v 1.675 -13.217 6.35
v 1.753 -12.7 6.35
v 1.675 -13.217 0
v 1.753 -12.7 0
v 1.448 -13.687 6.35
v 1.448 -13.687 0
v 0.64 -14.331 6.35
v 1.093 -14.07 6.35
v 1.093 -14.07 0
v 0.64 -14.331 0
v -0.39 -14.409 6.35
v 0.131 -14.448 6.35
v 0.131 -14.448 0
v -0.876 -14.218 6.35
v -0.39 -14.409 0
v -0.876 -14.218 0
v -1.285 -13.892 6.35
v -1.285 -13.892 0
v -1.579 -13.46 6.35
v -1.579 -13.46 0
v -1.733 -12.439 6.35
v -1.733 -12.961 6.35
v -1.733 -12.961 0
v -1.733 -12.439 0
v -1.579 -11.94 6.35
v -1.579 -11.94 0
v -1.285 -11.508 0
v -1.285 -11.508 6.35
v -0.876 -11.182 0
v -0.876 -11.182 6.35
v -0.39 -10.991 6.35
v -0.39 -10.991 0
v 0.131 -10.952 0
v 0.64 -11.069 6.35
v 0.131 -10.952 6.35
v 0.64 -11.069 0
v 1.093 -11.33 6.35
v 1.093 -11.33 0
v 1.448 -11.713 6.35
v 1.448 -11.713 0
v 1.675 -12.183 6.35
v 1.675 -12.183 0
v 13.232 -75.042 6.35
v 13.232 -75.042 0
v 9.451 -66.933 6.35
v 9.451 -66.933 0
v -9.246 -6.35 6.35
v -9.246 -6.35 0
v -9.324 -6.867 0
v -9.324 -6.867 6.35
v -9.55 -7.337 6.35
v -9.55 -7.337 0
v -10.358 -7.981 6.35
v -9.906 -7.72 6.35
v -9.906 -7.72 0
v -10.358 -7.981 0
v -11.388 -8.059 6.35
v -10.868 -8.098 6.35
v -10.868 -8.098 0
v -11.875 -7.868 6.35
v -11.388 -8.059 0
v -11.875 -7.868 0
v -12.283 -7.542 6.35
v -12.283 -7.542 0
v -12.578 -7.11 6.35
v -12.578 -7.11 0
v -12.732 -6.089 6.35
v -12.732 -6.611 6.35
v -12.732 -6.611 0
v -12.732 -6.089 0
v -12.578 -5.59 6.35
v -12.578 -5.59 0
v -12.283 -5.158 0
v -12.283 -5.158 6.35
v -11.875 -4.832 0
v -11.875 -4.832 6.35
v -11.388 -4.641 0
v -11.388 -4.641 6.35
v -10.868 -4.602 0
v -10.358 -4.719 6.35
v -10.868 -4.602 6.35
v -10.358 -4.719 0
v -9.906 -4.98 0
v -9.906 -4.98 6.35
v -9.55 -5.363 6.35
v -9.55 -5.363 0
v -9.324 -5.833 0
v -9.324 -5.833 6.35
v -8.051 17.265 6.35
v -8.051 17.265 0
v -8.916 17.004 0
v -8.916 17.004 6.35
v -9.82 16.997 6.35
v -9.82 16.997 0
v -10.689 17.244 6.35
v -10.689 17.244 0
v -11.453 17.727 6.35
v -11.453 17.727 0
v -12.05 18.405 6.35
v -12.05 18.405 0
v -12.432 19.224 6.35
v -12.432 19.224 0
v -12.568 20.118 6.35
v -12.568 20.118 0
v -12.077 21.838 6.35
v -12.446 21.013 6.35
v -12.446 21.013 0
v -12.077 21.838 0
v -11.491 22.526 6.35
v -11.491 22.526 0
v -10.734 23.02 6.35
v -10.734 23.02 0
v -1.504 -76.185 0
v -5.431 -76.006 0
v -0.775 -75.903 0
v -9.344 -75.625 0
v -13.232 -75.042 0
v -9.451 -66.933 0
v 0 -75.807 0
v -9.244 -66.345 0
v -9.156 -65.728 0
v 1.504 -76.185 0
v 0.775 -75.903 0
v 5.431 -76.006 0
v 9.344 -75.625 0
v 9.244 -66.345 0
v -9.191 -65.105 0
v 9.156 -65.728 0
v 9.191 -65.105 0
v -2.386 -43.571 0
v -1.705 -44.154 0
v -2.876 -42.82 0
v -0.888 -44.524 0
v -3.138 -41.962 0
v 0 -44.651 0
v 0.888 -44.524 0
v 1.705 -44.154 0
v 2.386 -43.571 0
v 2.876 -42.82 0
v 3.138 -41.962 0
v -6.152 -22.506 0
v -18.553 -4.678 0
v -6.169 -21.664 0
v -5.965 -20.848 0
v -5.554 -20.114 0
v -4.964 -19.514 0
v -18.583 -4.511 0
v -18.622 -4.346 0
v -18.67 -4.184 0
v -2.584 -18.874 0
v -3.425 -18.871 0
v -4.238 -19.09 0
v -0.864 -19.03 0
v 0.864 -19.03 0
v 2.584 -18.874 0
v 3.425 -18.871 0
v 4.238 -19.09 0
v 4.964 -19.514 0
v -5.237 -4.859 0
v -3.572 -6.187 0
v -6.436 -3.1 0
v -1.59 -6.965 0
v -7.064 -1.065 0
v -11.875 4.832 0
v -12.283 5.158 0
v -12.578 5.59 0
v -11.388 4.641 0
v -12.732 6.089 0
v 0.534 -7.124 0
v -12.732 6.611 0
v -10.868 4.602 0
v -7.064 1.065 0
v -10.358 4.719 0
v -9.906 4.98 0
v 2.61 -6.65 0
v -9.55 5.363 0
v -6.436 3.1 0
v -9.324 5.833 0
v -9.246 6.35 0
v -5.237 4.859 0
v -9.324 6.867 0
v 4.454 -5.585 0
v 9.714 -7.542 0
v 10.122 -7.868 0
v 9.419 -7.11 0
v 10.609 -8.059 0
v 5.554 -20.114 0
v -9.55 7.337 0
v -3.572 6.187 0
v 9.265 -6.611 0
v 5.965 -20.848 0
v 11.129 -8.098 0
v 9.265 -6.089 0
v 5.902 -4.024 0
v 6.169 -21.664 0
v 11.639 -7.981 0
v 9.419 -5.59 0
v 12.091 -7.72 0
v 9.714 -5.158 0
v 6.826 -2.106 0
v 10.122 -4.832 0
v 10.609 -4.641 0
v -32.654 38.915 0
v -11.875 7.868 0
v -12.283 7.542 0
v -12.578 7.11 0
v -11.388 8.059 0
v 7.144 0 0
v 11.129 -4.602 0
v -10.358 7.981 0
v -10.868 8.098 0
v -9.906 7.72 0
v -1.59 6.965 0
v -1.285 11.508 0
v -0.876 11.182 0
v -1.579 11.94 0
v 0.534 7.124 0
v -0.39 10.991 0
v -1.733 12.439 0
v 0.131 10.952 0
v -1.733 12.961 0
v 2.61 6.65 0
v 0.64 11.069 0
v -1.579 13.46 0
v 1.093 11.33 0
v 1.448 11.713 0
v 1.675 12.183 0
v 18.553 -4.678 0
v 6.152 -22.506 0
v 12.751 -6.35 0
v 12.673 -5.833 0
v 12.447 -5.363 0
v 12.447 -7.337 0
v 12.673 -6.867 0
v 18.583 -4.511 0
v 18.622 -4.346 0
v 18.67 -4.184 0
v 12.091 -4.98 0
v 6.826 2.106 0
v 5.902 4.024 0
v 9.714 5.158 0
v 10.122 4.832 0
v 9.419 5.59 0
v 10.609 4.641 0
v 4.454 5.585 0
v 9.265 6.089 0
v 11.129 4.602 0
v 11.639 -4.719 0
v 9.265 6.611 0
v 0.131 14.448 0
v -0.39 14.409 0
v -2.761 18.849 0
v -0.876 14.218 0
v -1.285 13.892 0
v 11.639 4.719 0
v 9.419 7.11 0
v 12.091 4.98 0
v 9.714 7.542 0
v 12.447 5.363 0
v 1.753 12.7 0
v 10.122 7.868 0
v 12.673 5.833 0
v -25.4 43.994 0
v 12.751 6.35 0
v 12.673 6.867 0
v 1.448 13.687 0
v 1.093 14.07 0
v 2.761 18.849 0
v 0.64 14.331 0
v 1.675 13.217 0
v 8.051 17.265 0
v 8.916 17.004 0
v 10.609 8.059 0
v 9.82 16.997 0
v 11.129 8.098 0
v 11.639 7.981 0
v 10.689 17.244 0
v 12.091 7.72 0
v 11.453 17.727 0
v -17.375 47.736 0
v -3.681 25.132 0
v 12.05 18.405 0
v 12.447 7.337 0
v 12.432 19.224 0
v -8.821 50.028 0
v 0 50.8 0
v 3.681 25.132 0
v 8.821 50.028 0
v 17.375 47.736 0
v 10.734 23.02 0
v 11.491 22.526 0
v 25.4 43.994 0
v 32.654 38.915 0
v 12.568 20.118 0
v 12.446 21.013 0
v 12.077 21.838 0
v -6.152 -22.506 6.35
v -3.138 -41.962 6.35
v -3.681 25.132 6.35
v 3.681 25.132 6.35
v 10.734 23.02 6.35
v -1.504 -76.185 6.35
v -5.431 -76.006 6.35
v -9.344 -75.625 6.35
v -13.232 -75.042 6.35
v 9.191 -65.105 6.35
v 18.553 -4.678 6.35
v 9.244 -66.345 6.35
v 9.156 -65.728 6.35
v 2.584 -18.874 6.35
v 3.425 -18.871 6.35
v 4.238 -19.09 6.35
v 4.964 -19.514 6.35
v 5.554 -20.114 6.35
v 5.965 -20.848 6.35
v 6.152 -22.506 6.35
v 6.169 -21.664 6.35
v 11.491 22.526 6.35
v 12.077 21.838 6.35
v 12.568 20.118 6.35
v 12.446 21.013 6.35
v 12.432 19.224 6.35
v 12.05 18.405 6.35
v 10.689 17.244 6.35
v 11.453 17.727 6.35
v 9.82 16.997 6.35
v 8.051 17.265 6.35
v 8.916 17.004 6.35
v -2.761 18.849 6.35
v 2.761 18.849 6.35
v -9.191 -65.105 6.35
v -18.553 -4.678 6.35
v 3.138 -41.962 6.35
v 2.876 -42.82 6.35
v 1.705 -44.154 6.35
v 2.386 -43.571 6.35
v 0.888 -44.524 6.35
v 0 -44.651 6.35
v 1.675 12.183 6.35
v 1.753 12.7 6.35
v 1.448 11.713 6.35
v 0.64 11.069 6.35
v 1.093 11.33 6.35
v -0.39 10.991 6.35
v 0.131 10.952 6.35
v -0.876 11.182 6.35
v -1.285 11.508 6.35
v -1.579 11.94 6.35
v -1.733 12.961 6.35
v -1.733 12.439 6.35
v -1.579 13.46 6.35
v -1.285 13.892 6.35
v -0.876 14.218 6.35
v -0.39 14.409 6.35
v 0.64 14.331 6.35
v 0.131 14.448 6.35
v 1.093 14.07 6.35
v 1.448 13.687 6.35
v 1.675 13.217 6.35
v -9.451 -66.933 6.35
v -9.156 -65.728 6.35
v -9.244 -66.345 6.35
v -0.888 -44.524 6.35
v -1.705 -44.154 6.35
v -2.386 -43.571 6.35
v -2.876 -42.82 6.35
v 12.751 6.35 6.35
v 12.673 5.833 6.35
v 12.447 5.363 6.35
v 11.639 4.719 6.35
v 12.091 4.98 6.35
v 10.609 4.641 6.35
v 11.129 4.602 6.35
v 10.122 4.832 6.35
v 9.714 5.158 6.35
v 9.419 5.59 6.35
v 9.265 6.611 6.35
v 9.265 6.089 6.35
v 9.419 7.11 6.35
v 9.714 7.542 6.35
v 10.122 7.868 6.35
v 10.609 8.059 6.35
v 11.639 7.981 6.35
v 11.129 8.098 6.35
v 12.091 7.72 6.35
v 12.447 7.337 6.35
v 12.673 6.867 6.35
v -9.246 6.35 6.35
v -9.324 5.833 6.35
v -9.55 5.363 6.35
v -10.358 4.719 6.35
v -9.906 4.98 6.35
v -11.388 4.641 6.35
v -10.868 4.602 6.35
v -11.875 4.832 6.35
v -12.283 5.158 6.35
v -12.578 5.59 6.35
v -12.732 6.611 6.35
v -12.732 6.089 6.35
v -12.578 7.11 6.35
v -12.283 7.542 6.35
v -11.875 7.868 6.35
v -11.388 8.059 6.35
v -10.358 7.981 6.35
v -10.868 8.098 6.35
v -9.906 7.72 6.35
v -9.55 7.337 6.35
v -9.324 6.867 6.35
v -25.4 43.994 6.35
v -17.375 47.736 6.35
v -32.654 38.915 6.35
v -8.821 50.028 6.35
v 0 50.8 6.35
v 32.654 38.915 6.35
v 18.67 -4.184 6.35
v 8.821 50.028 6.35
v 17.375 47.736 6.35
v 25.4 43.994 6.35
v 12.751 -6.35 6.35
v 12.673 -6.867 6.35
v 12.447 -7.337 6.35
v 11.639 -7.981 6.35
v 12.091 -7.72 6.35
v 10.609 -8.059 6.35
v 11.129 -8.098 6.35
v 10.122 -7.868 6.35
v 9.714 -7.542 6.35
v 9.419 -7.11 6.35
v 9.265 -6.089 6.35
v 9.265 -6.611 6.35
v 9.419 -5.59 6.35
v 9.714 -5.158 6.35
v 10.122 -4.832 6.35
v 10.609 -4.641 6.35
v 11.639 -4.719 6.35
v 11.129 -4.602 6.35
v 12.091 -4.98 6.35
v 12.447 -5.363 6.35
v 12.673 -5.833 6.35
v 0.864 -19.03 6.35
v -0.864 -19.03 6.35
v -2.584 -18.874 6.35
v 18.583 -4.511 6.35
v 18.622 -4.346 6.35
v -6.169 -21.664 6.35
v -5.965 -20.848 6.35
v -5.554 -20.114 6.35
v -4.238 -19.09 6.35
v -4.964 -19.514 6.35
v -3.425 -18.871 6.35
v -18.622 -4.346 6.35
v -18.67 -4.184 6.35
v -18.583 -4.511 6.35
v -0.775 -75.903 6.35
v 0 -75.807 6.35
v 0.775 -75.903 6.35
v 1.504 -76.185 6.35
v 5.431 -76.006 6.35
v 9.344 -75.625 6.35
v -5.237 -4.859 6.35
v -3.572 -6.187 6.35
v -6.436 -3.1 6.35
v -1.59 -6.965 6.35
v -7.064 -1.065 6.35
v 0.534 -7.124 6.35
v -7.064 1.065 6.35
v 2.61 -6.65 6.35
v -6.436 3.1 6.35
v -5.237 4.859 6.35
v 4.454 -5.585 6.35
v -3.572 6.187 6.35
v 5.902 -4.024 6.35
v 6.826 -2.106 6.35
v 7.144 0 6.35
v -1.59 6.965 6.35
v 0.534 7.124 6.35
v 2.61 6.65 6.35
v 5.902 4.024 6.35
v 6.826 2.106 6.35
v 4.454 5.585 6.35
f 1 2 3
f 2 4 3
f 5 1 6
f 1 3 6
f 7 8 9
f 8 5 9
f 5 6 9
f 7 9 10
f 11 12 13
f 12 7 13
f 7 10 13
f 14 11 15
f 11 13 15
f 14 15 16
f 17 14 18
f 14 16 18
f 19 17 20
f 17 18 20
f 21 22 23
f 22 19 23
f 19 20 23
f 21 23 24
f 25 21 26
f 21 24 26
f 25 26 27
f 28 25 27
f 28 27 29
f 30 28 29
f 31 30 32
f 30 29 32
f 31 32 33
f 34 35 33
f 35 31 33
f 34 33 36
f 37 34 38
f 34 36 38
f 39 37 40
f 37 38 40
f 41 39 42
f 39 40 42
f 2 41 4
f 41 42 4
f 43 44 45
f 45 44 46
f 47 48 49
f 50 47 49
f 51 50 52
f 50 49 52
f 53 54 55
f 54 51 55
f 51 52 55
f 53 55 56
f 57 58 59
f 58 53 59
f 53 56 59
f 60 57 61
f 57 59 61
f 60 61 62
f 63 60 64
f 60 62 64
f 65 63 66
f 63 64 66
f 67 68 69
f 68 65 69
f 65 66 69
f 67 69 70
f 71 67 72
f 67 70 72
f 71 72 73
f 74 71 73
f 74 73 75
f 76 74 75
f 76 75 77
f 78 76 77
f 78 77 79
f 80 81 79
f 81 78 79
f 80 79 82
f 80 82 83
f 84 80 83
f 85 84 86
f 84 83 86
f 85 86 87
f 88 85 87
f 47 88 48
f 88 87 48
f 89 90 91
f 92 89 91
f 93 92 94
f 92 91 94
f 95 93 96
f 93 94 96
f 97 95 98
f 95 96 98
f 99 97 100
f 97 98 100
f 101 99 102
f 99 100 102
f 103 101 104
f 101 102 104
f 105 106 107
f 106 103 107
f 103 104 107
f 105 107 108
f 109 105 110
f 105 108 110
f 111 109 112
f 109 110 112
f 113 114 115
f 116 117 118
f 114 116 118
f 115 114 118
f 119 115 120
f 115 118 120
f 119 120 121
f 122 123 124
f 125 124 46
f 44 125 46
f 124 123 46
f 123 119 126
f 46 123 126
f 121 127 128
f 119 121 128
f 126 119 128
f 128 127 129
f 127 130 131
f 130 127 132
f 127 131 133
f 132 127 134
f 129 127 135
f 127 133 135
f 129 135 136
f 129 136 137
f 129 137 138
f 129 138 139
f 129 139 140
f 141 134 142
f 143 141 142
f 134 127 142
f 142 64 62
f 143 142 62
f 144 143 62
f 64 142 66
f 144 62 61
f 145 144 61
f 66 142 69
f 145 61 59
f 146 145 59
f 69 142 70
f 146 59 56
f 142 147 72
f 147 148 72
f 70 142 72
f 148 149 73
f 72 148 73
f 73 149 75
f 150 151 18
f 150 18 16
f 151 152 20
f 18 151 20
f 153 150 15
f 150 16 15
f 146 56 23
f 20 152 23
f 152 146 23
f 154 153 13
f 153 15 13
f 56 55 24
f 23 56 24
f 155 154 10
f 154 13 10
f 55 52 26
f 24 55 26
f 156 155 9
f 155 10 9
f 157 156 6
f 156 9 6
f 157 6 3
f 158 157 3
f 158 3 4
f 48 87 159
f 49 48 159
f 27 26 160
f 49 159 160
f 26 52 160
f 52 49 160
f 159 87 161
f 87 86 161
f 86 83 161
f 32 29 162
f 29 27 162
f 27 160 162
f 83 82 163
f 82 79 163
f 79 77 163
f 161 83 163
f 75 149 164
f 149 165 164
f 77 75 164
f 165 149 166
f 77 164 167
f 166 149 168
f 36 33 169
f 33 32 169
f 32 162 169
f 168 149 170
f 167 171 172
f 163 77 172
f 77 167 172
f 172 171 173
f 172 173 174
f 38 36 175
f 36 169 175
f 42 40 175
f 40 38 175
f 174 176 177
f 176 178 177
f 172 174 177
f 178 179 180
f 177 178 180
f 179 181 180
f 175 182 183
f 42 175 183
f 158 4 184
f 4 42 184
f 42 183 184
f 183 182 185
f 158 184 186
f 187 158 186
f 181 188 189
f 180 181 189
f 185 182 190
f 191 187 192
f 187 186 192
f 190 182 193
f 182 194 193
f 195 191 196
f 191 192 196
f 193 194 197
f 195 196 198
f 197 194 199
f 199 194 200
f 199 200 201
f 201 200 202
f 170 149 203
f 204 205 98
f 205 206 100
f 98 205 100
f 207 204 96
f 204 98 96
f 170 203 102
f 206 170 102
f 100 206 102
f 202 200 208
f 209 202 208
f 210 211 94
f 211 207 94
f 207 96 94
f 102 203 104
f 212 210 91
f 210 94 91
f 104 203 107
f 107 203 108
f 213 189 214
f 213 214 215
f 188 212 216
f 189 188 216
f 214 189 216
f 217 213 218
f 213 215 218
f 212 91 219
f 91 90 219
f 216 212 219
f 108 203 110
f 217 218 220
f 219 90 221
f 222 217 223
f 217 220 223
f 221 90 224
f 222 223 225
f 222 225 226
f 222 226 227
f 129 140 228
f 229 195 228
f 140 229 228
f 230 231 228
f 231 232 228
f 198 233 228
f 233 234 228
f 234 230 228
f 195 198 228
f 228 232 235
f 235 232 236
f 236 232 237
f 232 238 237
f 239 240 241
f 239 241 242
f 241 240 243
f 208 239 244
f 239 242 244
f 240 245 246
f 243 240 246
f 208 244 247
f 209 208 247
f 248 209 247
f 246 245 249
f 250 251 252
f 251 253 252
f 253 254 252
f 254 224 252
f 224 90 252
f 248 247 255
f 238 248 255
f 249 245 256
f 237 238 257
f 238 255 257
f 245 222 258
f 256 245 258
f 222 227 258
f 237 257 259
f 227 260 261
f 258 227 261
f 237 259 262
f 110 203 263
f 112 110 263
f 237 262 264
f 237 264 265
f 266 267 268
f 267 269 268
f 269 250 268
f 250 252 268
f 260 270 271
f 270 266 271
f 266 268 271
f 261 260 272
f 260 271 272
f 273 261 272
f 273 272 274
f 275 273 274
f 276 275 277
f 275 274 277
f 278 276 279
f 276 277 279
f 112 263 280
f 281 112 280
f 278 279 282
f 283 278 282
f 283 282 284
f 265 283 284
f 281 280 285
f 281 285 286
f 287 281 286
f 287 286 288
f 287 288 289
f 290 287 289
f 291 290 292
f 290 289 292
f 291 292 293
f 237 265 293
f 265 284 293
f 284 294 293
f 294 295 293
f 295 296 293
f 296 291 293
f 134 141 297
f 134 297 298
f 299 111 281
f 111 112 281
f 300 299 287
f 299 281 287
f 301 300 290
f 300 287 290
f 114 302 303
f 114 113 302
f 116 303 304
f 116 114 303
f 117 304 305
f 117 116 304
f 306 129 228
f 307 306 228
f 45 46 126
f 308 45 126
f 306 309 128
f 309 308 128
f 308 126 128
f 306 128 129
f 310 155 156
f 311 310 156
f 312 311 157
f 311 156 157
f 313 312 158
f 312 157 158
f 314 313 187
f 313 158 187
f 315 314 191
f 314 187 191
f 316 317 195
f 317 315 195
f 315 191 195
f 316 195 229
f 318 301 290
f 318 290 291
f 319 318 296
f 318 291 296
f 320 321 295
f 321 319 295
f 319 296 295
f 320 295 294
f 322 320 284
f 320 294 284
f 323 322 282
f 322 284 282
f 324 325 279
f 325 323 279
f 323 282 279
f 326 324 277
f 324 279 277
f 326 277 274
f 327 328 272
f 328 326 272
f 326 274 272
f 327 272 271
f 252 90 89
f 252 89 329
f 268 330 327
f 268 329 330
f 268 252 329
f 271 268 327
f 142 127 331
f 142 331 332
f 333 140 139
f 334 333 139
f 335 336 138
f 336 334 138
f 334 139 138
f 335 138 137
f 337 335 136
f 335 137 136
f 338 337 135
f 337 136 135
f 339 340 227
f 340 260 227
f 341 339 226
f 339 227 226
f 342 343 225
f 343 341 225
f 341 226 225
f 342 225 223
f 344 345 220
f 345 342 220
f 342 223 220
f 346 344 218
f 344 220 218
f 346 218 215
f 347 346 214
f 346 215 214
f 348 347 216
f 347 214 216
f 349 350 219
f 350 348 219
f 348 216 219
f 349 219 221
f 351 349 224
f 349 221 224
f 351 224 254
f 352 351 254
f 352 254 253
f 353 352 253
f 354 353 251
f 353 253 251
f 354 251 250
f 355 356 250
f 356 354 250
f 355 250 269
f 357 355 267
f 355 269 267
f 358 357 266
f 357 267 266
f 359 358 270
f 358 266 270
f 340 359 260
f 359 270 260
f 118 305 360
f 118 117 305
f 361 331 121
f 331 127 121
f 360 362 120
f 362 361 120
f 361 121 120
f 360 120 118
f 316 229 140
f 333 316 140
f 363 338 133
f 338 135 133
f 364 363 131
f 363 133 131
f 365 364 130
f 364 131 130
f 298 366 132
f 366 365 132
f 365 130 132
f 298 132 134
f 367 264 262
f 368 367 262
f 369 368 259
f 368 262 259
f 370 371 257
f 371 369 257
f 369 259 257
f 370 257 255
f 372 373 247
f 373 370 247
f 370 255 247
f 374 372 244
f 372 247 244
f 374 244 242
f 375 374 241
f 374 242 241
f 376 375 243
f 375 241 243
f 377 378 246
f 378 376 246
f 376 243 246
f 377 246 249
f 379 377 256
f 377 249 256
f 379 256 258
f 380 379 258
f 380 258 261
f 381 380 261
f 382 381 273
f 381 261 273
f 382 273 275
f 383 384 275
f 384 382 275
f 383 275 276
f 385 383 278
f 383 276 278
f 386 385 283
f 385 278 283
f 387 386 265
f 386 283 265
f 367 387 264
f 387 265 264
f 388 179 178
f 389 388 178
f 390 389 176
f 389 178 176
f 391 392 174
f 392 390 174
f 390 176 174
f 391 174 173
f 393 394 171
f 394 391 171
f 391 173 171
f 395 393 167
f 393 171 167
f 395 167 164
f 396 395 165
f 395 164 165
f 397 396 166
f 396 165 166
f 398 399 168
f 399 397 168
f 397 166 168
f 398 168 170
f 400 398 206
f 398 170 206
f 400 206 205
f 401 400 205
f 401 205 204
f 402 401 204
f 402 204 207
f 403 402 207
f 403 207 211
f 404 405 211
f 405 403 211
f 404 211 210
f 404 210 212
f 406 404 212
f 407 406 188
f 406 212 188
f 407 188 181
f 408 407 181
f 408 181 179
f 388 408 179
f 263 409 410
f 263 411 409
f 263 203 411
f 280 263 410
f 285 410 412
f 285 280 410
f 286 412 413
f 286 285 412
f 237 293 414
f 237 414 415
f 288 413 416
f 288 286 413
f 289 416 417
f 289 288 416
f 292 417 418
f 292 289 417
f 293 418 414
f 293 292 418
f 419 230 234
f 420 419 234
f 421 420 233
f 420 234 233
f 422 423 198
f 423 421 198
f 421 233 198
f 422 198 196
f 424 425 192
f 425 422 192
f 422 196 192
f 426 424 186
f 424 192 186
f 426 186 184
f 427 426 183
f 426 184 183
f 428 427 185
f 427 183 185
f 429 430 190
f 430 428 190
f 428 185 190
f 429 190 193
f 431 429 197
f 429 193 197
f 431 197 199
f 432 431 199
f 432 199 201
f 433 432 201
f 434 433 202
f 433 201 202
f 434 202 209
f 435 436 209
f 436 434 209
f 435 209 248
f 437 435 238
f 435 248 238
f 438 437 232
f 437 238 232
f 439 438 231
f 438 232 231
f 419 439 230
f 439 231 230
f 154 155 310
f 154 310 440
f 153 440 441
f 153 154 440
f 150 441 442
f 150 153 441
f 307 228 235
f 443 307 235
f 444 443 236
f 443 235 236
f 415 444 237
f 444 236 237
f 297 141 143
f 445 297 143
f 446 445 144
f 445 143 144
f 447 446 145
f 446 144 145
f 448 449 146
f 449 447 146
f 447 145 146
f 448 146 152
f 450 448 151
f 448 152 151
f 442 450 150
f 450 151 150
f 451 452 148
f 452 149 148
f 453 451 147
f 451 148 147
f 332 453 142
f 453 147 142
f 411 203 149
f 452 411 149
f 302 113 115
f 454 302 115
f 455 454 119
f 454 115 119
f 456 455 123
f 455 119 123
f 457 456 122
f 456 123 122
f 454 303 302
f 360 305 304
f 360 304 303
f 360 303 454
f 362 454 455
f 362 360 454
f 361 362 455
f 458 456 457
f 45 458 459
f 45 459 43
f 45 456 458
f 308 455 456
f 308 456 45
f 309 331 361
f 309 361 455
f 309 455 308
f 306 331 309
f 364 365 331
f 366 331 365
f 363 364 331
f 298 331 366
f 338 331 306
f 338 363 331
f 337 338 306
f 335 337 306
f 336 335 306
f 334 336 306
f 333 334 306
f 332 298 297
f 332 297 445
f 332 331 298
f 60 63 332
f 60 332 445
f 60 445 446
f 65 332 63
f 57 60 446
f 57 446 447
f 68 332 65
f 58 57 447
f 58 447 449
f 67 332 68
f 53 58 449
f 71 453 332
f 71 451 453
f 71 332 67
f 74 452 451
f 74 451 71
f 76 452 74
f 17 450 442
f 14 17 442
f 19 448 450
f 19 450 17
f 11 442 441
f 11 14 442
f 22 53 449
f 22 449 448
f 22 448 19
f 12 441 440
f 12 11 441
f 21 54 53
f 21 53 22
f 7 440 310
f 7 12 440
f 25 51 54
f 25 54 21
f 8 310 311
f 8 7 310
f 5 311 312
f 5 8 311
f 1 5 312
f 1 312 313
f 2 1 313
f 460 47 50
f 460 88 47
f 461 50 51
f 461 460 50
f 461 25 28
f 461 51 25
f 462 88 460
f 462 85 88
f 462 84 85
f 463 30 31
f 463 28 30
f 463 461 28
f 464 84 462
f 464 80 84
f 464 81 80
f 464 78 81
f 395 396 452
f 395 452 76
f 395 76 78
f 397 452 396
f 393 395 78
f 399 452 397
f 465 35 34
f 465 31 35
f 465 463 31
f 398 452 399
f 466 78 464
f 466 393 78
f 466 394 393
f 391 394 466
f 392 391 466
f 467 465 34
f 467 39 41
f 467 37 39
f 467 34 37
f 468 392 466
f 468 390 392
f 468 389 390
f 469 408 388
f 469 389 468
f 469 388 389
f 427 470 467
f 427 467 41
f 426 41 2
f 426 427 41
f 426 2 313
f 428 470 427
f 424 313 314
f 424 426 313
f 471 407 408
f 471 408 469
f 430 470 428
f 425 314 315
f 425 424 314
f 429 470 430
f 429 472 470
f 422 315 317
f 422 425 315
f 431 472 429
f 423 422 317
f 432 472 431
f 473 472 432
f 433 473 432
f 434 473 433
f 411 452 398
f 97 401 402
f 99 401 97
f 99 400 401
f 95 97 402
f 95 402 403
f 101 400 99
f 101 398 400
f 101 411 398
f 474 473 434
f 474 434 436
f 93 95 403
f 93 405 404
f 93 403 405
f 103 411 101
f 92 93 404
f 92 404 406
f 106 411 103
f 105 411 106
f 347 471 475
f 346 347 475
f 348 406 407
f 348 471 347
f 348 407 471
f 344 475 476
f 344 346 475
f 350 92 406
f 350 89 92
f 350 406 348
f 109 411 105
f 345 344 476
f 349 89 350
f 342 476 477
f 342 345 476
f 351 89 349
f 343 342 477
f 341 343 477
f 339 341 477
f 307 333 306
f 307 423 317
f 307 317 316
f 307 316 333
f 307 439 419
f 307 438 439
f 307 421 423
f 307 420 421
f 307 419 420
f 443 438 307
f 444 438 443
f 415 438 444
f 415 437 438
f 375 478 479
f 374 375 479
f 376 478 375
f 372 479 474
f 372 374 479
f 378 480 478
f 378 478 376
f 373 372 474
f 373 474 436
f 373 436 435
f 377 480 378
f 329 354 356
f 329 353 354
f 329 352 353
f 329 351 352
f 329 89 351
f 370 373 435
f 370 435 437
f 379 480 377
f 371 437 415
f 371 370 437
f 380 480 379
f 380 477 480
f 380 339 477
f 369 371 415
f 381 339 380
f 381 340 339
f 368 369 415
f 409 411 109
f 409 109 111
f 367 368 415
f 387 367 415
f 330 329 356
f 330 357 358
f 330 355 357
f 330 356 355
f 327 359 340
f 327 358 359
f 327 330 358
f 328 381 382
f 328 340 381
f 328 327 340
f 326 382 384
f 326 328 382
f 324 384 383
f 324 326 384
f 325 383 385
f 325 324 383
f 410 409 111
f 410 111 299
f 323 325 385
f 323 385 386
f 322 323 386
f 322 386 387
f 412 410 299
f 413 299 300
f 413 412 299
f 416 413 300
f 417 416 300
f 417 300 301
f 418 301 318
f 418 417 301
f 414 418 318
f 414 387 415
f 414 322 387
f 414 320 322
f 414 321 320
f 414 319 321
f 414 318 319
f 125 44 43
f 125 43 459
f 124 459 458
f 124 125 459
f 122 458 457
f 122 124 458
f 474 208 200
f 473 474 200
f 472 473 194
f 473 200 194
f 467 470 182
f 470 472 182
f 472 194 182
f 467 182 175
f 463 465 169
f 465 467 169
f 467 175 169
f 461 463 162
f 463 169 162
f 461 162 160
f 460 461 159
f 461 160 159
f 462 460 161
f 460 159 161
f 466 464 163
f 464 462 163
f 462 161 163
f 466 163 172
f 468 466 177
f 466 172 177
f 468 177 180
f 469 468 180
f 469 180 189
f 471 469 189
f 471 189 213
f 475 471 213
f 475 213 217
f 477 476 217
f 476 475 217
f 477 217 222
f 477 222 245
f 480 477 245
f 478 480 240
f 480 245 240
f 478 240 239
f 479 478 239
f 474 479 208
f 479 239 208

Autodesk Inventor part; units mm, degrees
ref_plane "YZ Plane" through (0, 0, 0) normal (1, 0, 0) x (0, 1, 0)
ref_plane "XZ Plane" through (0, 0, 0) normal (0, 1, 0) x (-1, 0, 0)
ref_plane "XY Plane" through (0, 0, 0) normal (0, 0, 1) x (1, 0, 0)
sketch "Sketch1" plane through (0, 0, 0) normal (0, 0, 1) x (1, 0, 0)
  circle A0 centre (0, 0) radius 7.1437
  line L0 (0, 0) -> (0, 12.7) construction
  circle A1 centre (0, 12.7) radius 1.7526
  circle A2 centre (-10.9985, 6.35) radius 1.7526
  circle A3 centre (-10.9985, -6.35) radius 1.7526
  circle A4 centre (0, -12.7) radius 1.7526
  circle A5 centre (10.9985, -6.35) radius 1.7526
  circle A6 centre (10.9985, 6.35) radius 1.7526
  circle A7 centre (0, 0) radius 19.05
  circle A8 centre (0, 0) radius 76.2 construction
  line L1 (0, 0) -> (-13.232, -75.0424) construction
  line L2 (-13.232, -75.0424) -> (4.8119, -36.3472) construction
  line L3 (-13.232, -75.0424) -> (-9.0429, -66.0589)
  line L4 (-9.0429, -66.0589) -> (-18.8254, -2.9166)
  circle A9 centre (0, 0) radius 66.675 construction
  line L5 (0, 0) -> (0, -76.2) construction
  arc A10 (-13.232, -75.0424) -> (0, -76.2) centre (0, 0) ccw
  line L6 (13.232, -75.0424) -> (9.0429, -66.0589)
  line L7 (9.0429, -66.0589) -> (18.8254, -2.9166)
  arc A11 (0, -76.2) -> (13.232, -75.0424) centre (0, 0) ccw
  arc A12 (-2.5837, -18.874) -> (-6.1519, -22.5057) centre (-3.0143, -22.0196) ccw
  line L8 (-6.1519, -22.5057) -> (-3.1376, -41.9621)
  arc A13 (-3.1376, -41.9621) -> (0, -44.651) centre (0, -41.476) ccw
  arc A14 (6.1519, -22.5057) -> (2.5837, -18.874) centre (3.0143, -22.0196) ccw
  line L9 (6.1519, -22.5057) -> (3.1376, -41.9621)
  arc A15 (0, -44.651) -> (3.1376, -41.9621) centre (0, -41.476) ccw
  circle A16 centre (0, 0) radius 50.8 construction
  line L10 (-32.6536, 38.9151) -> (-18.1201, -5.8791)
  line L11 (-32.6536, 38.9151) -> (0, 0) construction
  arc A17 (0, 50.8) -> (-32.6536, 38.9151) centre (0, 0) ccw
  line L12 (32.6536, 38.9151) -> (18.1201, -5.8791)
  line L13 (32.6536, 38.9151) -> (0, 0) construction
  arc A18 (32.6536, 38.9151) -> (0, 50.8) centre (0, 0) ccw
  arc A19 (9.3927, 20.1427) -> (-9.3927, 20.1427) centre (0, 0) ccw construction
  arc A20 (10.7345, 23.0202) -> (-10.7345, 23.0202) centre (0, 0) ccw
  arc A21 (8.0509, 17.2652) -> (-8.0509, 17.2652) centre (0, 0) ccw
  arc A22 (8.0509, 17.2652) -> (10.7345, 23.0202) centre (9.3927, 20.1427) ccw
  arc A23 (-10.7345, 23.0202) -> (-8.0509, 17.2652) centre (-9.3927, 20.1427) ccw
  line L14 (-9.3927, 20.1427) -> (0, 0) construction
  line L15 (0, 0) -> (9.3927, 20.1427) construction
  line L16 (0, -72.9607) -> (-1.5036, -76.1852)
  line L17 (-1.5036, -76.1852) -> (0, -72.9607)
  line L18 (1.5036, -76.1852) -> (0, -72.9607)
  point P0 (-18.5915, -4.4261)
  point P1 (18.5915, -4.4261)
  point P2 (2.5837, -18.874)
  point P3 (-11.1375, -70.5506)
  point P4 (8.0509, 17.2652)
  point P5 (-8.0509, 17.2652)
  dimension "d10" = 133.35
  dimension "d0" = 14.2875
  dimension "d1" = 12.7
  dimension "d2" = 3.5052
  dimension "d5" = 360
  dimension "d7" = 38.1
  dimension "d8" = 152.4
  dimension "d9" = 15
  dimension "d11" = 10
  dimension "d12" = 6.35
  dimension "d14" = 6.35
  dimension "d15" = 9.525
  dimension "d16" = 101.6
  dimension "d17" = 80
  dimension "d18" = 50
  dimension "d19" = 3.175
  dimension "d20" = 22.225
  dimension "d25" = 11.1125
extrude "Extrusion1" add sketch "Sketch1" along normal blind 6.35 contours A7 | A7 A22 A20 A23 L4 L10 A17 A18 L12 L7 | L7 L12 A7 | L12 L7 L6 A11 L18 L16 A10 L3 L4 L10 A7 A12 L8 A13 A15 L9 A14 | A7 L10 L4
fillet "Fillet1" radius 3.175 5 edges at (18.5915, -4.4261, 3.175) (9.0429, -66.0589, 3.175) (-18.5915, -4.4261, 3.175) (-9.0429, -66.0589, 3.175) (0, -72.9607, 3.175)
sketch "Sketch2" plane through (0, 0, 6.35) normal (0, 0, 1) x (1, 0, 0)
  arc A0 (1.5036, -76.1852) -> (13.232, -75.0424) centre (0, 0) ccw projected
  circle A1 centre (0, 0) radius 76.2 construction
properties part number "Blade (Bar 3)" material "Steel, Alloy"
